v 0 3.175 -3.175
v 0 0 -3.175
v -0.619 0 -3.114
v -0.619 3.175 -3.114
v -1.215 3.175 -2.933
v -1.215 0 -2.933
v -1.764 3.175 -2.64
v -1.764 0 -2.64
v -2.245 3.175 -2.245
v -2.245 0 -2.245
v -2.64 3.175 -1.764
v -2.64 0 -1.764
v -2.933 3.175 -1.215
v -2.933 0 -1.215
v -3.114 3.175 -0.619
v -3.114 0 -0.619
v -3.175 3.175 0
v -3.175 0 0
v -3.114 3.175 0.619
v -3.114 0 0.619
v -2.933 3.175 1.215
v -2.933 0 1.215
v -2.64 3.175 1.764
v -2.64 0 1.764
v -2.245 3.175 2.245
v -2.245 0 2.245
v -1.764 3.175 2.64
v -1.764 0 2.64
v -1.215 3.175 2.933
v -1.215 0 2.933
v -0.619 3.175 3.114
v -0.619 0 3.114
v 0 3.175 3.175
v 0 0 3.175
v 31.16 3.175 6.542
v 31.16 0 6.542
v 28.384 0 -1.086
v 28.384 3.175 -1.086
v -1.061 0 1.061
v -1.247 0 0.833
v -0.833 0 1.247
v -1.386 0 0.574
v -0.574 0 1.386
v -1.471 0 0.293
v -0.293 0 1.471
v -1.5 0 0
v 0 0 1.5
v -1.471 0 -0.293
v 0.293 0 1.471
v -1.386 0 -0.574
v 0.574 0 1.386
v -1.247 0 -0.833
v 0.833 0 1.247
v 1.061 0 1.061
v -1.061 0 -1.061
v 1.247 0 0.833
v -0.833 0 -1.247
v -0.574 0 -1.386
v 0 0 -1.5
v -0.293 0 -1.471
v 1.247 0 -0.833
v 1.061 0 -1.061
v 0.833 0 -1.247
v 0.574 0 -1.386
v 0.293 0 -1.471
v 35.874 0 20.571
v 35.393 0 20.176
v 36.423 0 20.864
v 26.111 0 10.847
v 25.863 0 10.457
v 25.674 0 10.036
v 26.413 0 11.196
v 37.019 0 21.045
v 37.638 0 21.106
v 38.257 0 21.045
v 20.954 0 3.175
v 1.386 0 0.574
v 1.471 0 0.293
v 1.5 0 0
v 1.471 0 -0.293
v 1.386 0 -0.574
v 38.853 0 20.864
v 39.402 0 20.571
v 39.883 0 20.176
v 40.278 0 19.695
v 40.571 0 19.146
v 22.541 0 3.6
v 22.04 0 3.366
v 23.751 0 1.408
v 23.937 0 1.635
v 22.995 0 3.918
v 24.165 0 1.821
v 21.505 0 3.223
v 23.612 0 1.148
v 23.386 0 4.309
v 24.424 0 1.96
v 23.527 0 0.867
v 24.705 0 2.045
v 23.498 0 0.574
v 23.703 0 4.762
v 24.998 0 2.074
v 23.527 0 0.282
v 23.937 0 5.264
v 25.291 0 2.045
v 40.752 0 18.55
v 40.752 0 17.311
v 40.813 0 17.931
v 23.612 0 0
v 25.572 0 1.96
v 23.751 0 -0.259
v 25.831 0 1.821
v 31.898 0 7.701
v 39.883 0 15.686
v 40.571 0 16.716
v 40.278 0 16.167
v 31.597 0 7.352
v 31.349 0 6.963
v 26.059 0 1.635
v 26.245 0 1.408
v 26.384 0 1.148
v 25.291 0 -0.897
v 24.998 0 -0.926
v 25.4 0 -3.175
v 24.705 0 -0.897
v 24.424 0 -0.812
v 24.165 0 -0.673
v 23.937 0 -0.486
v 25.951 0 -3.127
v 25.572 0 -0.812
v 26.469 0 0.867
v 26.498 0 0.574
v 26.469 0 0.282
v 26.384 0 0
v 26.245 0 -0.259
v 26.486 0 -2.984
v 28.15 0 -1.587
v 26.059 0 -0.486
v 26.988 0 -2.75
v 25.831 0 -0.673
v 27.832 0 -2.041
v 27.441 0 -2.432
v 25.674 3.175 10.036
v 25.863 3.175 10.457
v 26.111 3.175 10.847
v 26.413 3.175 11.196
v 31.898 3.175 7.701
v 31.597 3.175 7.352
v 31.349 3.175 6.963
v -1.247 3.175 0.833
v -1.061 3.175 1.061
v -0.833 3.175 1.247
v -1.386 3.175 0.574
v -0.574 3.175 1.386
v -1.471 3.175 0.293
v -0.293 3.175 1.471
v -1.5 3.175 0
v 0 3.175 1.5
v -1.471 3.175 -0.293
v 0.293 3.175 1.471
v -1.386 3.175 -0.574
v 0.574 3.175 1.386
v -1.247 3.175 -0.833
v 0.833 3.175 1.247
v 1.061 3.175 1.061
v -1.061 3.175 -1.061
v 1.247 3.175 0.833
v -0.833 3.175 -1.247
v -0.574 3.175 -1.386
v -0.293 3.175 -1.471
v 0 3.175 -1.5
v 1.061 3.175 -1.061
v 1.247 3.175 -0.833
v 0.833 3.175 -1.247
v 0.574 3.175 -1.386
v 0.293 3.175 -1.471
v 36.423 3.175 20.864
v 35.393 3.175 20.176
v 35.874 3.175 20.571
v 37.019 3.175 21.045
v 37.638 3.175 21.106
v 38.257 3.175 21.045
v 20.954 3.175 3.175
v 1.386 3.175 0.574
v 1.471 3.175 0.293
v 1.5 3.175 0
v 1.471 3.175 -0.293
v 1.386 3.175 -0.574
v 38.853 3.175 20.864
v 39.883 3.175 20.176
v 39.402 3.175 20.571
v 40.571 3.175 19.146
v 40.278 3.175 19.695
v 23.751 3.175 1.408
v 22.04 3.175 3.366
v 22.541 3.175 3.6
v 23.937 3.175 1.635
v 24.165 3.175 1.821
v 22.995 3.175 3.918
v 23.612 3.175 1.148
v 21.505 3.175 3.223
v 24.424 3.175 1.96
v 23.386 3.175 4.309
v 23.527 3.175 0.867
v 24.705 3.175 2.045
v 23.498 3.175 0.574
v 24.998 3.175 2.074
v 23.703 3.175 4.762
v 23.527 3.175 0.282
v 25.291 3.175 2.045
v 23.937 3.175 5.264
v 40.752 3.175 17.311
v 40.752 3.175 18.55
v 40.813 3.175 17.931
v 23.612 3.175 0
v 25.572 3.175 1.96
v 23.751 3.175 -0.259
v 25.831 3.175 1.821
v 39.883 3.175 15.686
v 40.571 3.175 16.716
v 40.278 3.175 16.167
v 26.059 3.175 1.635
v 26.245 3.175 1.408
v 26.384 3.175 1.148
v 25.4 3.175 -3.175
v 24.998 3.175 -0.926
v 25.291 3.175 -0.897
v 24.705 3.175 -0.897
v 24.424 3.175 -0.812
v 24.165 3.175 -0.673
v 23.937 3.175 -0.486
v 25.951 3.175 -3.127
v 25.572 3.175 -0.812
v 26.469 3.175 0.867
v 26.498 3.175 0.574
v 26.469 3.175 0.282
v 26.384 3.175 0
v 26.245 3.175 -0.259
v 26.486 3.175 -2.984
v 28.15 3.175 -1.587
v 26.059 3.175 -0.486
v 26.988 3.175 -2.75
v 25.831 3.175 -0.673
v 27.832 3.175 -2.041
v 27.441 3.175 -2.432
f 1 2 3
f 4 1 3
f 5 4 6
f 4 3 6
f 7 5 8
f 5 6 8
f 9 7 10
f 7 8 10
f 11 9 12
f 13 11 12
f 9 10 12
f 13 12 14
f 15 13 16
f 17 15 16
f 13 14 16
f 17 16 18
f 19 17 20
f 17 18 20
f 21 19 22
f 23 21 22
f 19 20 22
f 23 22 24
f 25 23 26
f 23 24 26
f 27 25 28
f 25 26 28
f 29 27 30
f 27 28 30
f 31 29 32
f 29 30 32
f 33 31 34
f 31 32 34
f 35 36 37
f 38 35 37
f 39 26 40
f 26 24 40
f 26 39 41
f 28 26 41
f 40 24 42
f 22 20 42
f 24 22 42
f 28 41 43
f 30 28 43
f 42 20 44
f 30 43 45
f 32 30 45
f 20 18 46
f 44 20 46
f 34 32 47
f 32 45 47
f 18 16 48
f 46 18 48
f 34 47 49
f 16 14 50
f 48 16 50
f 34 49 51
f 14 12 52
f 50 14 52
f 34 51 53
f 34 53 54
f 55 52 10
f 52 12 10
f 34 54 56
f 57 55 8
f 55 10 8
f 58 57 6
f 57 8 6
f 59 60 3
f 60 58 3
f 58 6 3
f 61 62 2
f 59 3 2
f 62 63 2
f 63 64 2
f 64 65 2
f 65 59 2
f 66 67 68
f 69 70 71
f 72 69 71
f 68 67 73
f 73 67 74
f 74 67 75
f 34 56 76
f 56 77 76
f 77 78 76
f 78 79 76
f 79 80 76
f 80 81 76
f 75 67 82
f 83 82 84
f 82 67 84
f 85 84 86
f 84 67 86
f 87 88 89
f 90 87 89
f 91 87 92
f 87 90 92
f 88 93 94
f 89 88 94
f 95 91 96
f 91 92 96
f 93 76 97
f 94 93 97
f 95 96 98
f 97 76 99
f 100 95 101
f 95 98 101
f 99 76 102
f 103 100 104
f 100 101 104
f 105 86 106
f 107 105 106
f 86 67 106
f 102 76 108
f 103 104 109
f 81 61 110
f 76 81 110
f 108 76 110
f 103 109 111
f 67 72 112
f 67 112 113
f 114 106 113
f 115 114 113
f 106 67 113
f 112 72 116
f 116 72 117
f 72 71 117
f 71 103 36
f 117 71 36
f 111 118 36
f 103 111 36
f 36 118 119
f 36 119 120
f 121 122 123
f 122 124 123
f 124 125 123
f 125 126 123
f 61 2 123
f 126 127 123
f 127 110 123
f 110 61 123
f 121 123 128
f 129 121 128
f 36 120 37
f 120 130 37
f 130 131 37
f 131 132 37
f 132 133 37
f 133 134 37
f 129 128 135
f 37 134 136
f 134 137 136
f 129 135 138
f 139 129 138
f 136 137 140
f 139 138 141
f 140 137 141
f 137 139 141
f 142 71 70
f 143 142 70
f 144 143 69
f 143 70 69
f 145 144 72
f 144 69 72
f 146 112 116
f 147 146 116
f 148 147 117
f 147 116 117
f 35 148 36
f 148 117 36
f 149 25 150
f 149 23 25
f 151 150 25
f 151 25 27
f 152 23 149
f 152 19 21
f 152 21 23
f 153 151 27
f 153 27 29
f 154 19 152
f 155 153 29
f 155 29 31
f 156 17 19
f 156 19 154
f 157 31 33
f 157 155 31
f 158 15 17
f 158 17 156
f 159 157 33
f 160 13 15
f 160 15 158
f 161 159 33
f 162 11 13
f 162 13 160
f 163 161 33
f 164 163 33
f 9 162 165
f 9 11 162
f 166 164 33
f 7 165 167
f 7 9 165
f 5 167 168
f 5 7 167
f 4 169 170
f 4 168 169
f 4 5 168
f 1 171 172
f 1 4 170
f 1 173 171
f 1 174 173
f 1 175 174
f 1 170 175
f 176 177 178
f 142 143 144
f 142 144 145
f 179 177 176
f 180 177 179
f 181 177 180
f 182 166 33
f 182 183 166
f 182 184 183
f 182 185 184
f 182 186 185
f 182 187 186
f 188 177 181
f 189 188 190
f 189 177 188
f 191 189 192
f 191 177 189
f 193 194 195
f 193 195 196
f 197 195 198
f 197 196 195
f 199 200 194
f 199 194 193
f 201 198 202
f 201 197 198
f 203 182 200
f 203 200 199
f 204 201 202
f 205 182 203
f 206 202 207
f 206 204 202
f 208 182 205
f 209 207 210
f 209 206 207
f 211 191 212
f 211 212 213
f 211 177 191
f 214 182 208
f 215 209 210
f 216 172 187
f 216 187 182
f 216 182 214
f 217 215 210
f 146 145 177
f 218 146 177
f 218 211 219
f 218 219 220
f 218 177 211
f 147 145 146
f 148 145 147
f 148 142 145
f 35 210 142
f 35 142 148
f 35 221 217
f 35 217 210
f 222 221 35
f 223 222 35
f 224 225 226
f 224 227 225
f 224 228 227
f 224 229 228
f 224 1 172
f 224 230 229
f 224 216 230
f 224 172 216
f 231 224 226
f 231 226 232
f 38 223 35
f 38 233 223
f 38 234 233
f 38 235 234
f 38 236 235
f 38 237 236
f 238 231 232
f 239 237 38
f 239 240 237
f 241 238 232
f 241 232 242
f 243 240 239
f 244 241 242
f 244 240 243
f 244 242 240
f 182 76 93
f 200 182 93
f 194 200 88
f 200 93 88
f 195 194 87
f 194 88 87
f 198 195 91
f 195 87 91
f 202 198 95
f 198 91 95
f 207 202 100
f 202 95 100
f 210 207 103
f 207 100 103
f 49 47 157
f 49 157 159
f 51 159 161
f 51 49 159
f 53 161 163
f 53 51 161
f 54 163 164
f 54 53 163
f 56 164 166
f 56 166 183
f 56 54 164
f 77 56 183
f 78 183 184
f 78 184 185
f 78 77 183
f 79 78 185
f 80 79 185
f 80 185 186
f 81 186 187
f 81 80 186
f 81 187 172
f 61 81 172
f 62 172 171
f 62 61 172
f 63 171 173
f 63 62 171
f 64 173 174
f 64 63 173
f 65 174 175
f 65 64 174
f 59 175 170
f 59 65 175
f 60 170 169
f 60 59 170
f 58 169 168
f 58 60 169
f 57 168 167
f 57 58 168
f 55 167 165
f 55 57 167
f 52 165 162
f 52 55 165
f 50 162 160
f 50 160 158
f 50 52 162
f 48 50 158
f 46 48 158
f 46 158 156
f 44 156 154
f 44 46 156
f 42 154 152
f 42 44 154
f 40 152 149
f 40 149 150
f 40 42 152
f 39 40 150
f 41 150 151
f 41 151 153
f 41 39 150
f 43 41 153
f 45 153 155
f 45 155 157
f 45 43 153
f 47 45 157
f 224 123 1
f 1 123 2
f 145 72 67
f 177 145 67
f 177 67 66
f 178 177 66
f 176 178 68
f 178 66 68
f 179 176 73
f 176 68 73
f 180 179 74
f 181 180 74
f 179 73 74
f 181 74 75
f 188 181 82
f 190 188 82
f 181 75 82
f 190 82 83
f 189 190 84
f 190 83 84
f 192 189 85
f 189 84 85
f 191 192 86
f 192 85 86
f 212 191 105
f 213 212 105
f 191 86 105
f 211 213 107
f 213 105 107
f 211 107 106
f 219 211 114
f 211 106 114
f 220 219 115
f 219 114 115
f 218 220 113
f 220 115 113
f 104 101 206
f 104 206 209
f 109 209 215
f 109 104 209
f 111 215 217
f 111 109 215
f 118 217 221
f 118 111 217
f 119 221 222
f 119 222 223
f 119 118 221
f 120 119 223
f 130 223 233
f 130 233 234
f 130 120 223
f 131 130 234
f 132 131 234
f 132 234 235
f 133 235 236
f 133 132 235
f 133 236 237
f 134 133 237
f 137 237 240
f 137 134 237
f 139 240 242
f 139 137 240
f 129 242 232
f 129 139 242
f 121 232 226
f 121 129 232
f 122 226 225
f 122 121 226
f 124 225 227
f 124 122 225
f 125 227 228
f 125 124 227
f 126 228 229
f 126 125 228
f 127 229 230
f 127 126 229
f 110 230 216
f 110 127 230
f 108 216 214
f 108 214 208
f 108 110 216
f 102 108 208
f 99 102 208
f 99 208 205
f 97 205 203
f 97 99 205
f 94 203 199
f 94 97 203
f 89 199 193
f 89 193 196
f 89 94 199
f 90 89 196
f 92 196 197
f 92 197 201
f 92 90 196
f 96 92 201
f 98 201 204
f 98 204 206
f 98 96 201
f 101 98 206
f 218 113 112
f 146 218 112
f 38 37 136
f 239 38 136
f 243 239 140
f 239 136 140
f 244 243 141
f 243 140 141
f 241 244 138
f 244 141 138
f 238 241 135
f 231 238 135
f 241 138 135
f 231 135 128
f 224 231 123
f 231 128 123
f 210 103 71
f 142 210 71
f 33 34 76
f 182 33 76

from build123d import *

# Parameters (mm, degrees)
SKETCH1_R           = 1.5
BOSS_EXTRUDE1_DEPTH = 3.175


with BuildPart() as part:
    # Sketch1 → Boss-Extrude1 (new body)
    with BuildSketch(Plane(origin=(0, 0, 0), x_dir=(1, 0, 0), z_dir=(0, 1, 0))):
        with BuildLine():
            Line((0, -3.175), (20.953682132, -3.175))
            ThreePointArc((20.953682132, -3.175), (22.774787318, -3.749192259), (23.937206203, -5.264086045))
            Line((23.937206203, -5.264086045), (25.674217794, -10.036486168))
            ThreePointArc((25.674217794, -10.036486168), (25.979974025, -10.656498469), (26.412677835, -11.195636243))
            Line((26.412677835, -11.195636243), (35.392933956, -20.175892364))
            ThreePointArc((35.392933956, -20.175892364), (39.883062017, -20.175892364), (39.883062017, -15.685764304))
            Line((39.883062017, -15.685764304), (31.898243321, -7.700945608))
            ThreePointArc((31.898243321, -7.700945608), (31.465539511, -7.161807835), (31.15978328, -6.541795533))
            Line((31.15978328, -6.541795533), (28.383524071, 1.085913955))
            ThreePointArc((28.383524071, 1.085913955), (27.221105185, 2.600807741), (25.4, 3.175))
            Line((25.4, 3.175), (0, 3.175))
            ThreePointArc((0, 3.175), (-3.175, 0), (0, -3.175))
        make_face()
        with Locations(Location((24.997946252, -0.574192259, 0), (0, 0, 270))):
            Circle(SKETCH1_R, mode=Mode.SUBTRACT)
        with Locations(Location((0, 0, 0), (0, 0, 270))):
            Circle(SKETCH1_R, mode=Mode.SUBTRACT)
    extrude(amount=BOSS_EXTRUDE1_DEPTH)


solid = part.part
